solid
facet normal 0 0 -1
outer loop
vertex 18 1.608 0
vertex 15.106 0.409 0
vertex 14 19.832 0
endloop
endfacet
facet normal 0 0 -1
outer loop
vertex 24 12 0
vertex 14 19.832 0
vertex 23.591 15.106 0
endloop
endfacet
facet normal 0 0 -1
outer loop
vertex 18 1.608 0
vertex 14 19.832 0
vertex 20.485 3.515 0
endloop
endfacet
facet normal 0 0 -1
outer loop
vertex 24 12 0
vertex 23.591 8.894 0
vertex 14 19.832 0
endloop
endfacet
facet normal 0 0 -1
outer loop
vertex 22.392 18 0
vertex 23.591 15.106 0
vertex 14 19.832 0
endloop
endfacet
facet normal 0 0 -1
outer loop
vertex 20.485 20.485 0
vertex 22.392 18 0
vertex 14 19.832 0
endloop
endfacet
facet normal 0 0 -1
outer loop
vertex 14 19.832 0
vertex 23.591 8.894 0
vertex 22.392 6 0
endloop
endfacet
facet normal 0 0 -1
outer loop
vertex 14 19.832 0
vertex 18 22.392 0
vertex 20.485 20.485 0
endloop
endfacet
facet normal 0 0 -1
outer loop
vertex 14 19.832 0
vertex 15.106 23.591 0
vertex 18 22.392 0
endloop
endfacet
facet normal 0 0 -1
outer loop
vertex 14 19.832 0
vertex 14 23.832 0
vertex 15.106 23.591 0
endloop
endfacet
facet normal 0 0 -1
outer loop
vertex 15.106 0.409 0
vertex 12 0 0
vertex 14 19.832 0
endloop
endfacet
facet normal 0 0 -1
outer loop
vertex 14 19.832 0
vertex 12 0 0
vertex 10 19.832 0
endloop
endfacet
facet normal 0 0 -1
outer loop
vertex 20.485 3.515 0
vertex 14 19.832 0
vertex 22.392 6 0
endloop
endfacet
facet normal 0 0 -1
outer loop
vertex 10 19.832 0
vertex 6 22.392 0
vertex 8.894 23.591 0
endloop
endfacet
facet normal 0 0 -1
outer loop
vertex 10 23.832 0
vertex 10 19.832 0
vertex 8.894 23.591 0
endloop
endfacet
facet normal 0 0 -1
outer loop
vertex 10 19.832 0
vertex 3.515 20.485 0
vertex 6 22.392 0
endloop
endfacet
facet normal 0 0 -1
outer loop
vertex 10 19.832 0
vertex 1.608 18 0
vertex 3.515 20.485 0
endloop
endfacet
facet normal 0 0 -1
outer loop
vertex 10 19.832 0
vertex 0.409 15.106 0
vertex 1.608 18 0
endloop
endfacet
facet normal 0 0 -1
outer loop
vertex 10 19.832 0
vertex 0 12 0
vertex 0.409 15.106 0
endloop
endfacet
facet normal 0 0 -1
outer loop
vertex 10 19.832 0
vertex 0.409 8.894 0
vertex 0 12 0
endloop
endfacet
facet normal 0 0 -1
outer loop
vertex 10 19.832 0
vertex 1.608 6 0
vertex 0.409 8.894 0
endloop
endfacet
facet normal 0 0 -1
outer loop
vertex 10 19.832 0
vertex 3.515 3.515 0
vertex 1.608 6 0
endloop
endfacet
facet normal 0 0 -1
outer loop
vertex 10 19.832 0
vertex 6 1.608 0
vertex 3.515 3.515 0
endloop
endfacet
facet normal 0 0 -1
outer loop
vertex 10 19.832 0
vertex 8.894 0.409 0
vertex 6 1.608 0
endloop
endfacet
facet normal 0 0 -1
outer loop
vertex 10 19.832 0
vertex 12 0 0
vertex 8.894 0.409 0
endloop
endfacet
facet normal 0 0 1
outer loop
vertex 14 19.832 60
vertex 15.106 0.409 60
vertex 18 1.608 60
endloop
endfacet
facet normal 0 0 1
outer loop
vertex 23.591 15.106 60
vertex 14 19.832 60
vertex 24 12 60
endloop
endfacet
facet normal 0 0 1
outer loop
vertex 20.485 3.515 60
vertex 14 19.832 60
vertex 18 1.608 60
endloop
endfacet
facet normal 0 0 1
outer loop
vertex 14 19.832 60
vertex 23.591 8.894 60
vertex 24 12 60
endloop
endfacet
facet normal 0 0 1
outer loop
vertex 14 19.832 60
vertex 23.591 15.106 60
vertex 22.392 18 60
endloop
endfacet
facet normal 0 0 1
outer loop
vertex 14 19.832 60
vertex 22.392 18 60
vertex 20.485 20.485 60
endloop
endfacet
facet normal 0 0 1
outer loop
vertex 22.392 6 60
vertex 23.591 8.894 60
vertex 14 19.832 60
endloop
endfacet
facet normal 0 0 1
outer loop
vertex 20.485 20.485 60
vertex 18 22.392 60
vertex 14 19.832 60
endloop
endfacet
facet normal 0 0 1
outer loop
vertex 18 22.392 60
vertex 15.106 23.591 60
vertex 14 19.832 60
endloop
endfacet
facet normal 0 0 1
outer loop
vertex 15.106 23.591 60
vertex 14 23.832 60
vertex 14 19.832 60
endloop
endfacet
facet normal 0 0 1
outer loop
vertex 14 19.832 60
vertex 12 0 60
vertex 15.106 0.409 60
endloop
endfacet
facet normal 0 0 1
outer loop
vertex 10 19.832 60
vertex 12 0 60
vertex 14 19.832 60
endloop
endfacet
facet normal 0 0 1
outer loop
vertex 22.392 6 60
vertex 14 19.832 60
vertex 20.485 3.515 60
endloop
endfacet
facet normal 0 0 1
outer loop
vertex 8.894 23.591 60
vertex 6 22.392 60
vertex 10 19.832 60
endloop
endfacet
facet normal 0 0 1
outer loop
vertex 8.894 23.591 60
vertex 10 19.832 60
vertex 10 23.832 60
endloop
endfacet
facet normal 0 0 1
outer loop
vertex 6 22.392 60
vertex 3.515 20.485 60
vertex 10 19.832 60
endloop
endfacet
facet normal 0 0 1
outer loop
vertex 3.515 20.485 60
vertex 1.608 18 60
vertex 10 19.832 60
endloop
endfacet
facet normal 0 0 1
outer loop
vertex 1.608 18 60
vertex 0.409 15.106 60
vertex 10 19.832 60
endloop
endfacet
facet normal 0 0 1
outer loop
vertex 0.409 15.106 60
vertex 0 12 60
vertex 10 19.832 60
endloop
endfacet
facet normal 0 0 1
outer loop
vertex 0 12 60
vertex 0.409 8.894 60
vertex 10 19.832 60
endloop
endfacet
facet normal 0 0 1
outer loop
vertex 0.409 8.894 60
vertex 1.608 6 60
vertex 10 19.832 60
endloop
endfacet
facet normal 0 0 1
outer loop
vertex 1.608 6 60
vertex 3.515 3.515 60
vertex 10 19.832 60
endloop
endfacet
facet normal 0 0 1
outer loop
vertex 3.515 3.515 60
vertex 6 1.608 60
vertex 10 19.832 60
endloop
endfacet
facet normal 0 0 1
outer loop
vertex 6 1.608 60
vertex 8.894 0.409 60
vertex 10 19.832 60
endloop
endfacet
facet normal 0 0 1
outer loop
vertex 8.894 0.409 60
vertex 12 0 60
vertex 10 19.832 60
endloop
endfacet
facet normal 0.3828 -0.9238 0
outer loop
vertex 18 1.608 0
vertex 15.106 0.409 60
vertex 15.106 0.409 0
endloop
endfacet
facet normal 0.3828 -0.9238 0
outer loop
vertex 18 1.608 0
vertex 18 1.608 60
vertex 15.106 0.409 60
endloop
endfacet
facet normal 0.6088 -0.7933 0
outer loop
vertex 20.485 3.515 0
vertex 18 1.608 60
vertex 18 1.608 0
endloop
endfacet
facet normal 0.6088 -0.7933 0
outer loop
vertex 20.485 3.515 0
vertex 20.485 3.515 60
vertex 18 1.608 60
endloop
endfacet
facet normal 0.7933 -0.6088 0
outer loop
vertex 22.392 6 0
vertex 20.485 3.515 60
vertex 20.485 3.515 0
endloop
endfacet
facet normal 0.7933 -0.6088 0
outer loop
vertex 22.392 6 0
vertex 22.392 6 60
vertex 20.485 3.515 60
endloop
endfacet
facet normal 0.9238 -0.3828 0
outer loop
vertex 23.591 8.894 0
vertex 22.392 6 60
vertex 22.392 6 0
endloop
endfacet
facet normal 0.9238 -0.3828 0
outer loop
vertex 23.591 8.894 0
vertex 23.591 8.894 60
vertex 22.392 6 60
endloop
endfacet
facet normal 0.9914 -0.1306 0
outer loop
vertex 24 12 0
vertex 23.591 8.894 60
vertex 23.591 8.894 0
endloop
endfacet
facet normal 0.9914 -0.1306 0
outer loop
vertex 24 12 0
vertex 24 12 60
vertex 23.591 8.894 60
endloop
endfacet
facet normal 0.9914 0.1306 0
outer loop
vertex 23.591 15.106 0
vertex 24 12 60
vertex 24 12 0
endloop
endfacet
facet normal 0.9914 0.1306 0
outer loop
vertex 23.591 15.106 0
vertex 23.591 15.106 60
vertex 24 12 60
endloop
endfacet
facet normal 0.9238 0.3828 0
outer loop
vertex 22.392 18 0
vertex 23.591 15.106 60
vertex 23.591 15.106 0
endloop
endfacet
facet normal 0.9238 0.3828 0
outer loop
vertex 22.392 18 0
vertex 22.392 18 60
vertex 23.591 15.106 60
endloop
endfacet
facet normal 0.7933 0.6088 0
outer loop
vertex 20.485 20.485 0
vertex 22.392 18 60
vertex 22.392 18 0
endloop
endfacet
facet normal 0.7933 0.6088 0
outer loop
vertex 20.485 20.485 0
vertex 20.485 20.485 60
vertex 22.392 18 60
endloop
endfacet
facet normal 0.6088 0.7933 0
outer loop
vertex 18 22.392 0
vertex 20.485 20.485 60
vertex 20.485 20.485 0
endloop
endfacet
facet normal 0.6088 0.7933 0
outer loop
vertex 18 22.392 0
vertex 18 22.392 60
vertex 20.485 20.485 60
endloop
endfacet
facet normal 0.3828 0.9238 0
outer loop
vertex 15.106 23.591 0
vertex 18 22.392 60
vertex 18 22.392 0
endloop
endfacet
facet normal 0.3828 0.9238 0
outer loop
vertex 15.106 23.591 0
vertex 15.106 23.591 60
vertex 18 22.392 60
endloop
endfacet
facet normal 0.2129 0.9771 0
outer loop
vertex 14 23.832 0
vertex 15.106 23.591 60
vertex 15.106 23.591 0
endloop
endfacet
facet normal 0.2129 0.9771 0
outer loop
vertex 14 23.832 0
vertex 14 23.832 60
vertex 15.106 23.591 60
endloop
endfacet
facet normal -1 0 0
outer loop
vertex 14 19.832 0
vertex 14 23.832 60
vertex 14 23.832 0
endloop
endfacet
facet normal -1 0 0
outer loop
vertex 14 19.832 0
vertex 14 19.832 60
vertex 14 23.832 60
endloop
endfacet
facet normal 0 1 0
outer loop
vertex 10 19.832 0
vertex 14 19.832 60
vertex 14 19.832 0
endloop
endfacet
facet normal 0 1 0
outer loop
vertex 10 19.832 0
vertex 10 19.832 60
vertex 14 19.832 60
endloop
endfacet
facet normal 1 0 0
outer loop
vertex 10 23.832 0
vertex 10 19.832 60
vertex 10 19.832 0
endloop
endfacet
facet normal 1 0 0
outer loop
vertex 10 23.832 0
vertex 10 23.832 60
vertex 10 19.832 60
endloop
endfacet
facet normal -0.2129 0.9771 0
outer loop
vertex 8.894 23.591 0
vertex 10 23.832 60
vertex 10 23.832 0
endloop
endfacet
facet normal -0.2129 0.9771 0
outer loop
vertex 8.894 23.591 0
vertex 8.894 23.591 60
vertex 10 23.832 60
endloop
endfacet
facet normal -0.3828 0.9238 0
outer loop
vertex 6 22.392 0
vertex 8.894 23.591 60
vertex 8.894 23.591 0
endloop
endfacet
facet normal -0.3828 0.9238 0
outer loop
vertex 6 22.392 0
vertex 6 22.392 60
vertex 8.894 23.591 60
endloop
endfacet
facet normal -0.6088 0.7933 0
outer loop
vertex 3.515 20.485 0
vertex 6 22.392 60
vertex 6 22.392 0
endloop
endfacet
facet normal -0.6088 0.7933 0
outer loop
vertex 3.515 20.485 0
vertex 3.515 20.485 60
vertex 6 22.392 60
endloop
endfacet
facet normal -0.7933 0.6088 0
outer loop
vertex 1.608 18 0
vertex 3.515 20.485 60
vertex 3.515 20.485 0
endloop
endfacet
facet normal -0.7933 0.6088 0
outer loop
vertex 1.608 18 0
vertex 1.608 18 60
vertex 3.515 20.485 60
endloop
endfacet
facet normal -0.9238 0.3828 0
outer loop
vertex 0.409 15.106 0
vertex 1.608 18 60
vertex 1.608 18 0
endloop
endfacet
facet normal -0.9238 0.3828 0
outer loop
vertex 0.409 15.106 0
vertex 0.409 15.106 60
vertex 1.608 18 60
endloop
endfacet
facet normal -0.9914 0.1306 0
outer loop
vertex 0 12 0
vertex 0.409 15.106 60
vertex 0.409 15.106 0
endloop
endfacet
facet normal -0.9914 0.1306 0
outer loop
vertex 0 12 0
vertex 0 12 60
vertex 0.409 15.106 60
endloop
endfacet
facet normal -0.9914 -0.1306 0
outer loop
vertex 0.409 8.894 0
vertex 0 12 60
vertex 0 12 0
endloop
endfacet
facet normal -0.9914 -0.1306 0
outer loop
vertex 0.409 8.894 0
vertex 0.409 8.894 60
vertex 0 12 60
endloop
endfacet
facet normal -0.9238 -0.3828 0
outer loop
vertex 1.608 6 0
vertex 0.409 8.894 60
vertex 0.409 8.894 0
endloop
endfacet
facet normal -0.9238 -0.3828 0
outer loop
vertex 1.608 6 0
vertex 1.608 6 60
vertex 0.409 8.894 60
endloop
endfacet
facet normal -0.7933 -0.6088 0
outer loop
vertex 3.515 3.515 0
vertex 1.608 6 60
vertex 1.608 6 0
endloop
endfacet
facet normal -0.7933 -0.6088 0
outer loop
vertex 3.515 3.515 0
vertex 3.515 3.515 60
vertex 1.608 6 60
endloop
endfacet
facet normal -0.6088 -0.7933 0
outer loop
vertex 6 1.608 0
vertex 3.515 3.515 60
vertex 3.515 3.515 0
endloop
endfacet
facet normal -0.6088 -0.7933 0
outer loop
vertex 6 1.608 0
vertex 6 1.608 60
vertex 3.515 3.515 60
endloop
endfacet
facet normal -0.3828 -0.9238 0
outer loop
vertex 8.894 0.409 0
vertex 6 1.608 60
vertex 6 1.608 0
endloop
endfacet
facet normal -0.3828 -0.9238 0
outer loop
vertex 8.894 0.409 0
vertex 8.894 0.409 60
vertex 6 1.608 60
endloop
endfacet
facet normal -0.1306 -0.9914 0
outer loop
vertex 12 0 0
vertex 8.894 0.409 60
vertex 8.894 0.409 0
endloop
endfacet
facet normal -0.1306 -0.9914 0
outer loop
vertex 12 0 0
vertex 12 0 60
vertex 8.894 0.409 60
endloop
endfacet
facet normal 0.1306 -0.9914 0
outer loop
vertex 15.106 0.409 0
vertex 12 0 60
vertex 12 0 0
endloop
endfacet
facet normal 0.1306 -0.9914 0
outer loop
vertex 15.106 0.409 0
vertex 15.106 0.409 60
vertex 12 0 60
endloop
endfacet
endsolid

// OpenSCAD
$fn = 32;

// ----------------------------------------------------------------------
// Keyway shaft: d24 shaft, key 4 x 4 mm
// ----------------------------------------------------------------------

// --- parameters (mm) ---
shaft_r = 12;             // shaft radius
key_w = 4;                // keyway width
key_d = 4;                // keyway depth below the surface line
plate_t = 60;             // shaft length, Z (extrusion height)

shaft_d = 2 * shaft_r;  // shaft diameter
circle_step = 15;  // polygon sampling step, degrees

profile = [[8.894, 23.591], [6, 22.392], [3.515, 20.485], [1.608, 18], [0.409, 15.106], [0, 12], [0.409, 8.894], [1.608, 6], [3.515, 3.515], [6, 1.608], [8.894, 0.409], [12, 0], [15.106, 0.409], [18, 1.608], [20.485, 3.515], [22.392, 6], [23.591, 8.894], [24, 12], [23.591, 15.106], [22.392, 18], [20.485, 20.485], [18, 22.392], [15.106, 23.591], [14, 23.832], [14, 19.832], [10, 19.832], [10, 23.832]];  // primary outline, 27 points, counter clockwise

// --- the one profile operation ---
linear_extrude(height = plate_t) polygon(points = profile);
